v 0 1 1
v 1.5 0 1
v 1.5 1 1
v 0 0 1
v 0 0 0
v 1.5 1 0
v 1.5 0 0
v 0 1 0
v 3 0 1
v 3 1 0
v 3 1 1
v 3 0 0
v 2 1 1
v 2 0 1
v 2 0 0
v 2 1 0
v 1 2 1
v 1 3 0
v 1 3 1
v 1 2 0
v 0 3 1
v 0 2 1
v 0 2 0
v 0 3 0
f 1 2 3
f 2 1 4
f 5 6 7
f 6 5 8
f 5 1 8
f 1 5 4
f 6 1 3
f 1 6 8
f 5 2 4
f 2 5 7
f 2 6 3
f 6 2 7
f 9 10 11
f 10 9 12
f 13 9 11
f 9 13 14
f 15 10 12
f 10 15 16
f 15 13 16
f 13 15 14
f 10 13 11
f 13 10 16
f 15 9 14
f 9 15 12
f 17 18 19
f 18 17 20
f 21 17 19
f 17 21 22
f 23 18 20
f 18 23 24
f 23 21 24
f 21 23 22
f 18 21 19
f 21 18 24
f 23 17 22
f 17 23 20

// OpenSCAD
color("red")
  cube();

translate([0.5, 0, 0])
  color("green")
    cube();

color("#0000FF44")
  translate([2, 0, 0])
    cube();

translate([0, 2, 0])
    cube();
